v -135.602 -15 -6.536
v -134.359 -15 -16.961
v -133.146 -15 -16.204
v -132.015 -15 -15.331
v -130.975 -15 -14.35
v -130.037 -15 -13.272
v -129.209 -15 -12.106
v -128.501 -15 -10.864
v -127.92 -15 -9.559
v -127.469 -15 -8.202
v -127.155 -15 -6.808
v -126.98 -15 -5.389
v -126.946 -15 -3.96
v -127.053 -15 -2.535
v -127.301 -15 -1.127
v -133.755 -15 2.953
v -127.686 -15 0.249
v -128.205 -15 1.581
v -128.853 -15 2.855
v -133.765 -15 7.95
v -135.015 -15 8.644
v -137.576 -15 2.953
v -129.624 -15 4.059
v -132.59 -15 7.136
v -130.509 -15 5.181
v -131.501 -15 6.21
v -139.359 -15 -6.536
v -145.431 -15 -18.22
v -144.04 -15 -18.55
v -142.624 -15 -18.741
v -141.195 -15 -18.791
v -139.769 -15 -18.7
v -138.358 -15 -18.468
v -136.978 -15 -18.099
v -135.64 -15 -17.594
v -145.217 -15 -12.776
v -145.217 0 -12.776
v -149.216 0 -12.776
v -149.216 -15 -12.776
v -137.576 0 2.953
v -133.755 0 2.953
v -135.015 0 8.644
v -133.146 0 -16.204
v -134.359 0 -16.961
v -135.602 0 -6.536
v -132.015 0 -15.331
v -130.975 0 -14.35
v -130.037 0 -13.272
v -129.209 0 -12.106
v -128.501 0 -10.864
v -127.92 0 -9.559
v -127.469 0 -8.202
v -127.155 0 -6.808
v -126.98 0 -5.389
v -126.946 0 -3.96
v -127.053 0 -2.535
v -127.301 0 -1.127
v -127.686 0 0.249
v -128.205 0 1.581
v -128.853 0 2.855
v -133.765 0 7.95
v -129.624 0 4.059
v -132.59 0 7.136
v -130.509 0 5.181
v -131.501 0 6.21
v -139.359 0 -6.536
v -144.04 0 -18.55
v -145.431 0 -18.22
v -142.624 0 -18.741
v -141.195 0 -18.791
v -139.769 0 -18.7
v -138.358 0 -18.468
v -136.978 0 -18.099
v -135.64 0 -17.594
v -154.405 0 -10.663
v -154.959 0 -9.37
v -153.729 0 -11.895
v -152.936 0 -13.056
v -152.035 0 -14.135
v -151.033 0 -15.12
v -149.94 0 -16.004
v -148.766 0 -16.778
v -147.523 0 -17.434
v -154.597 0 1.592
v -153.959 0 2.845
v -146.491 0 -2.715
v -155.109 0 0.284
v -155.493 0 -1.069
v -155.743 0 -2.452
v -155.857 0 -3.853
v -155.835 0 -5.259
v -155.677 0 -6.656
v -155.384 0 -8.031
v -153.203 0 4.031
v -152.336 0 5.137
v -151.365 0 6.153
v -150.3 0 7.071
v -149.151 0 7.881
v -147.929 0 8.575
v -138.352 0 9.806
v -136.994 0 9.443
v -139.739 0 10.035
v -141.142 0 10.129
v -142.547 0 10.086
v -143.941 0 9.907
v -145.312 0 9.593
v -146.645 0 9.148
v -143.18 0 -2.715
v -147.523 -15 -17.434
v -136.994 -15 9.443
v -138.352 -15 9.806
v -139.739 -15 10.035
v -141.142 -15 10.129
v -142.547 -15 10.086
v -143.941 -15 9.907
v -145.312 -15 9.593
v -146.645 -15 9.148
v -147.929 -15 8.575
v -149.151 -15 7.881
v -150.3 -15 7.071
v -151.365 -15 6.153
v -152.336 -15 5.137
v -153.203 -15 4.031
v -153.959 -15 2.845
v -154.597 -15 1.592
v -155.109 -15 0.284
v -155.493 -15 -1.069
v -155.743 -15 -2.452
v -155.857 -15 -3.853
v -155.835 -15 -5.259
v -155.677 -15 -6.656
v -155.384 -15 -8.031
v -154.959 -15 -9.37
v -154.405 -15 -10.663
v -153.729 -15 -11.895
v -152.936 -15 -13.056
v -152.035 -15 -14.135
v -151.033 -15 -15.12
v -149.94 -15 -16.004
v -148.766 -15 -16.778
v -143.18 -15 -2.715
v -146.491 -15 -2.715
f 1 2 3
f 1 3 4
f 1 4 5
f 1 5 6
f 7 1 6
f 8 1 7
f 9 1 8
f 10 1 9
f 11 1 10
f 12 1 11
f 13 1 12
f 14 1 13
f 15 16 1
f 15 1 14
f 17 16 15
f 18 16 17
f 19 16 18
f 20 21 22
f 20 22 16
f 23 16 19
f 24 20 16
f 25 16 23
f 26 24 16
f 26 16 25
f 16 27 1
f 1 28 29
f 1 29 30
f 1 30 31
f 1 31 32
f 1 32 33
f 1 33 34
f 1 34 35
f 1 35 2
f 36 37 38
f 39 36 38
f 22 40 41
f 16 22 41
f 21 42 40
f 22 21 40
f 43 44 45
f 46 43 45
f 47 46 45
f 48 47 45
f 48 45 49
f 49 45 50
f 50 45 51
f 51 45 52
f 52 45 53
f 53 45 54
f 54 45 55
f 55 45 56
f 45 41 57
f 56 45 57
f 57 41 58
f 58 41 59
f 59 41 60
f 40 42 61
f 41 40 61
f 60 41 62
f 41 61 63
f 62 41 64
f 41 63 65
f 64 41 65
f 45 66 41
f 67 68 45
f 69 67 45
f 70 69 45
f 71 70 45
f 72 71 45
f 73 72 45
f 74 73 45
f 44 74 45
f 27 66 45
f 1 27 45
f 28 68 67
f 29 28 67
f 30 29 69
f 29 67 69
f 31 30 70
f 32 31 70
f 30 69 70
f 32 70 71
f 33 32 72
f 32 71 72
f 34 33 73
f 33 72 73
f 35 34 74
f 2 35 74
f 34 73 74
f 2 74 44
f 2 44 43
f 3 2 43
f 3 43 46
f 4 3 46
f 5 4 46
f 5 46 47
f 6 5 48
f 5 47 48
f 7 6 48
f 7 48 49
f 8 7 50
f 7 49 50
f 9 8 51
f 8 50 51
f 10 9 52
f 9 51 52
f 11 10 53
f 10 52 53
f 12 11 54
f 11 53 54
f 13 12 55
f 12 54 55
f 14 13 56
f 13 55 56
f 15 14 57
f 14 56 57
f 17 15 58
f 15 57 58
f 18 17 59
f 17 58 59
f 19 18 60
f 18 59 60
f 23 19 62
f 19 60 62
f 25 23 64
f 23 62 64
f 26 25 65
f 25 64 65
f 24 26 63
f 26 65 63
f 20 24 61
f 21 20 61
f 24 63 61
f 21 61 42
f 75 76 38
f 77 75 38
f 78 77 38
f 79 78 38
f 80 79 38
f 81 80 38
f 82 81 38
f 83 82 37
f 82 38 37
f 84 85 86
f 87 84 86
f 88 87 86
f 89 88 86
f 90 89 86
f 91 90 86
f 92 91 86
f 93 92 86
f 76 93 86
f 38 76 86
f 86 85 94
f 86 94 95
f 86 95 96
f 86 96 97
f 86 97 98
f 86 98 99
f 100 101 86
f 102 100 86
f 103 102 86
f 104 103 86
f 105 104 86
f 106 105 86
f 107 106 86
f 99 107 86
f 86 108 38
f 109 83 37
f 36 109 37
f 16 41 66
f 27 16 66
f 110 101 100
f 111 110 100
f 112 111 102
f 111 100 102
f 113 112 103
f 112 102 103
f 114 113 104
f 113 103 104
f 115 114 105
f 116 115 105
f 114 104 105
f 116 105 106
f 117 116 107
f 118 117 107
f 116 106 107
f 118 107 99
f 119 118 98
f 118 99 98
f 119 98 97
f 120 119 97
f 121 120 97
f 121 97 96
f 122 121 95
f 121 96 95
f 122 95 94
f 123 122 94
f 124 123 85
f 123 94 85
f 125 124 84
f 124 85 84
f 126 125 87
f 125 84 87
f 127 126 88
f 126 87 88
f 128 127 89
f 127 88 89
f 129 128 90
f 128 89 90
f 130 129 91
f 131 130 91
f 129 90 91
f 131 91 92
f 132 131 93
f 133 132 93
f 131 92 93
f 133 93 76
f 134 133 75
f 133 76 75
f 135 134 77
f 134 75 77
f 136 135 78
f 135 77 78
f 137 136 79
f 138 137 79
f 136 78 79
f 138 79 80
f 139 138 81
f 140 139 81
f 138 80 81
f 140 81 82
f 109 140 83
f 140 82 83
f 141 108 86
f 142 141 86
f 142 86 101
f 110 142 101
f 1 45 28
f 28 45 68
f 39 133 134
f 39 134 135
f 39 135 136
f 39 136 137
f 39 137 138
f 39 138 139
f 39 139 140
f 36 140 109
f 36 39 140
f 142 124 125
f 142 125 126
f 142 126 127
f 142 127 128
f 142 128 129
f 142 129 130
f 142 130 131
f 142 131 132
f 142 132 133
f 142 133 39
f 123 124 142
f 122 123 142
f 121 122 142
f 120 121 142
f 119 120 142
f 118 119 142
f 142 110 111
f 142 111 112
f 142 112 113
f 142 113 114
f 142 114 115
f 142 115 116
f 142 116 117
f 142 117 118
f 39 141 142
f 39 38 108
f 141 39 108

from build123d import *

# Parameters (mm, degrees)
F1_DEPTH = 15


with BuildPart() as f1:
    # F0 (on Front) → F1 (new body)
    with BuildSketch(Plane.XZ):
        with BuildLine():
            Line((-146.490857, -2.71476), (-136.994367, 9.442892))
            ThreePointArc((-136.994367, 9.442892), (-154.868969, 0.944234), (-147.522661, -17.434025))
            Line((-147.522661, -17.434025), (-145.217258, -12.776169))
            Line((-145.217258, -12.776169), (-149.216349, -12.776169))
            Line((-149.216349, -12.776169), (-143.179506, -2.71476))
            Line((-143.179506, -2.71476), (-146.490857, -2.71476))
        make_face()
        with BuildLine():
            ThreePointArc((-145.431007, -18.220298), (-127.919507, -9.55871), (-135.014854, 8.643812))
            Line((-135.014854, 8.643812), (-137.575682, 2.95274))
            Line((-137.575682, 2.95274), (-133.754894, 2.95274))
            Line((-133.754894, 2.95274), (-139.358718, -6.535548))
            Line((-139.358718, -6.535548), (-135.601608, -6.535548))
            Line((-135.601608, -6.535548), (-145.431007, -18.220298))
        make_face()
    extrude(amount=F1_DEPTH)


solid = f1.part
